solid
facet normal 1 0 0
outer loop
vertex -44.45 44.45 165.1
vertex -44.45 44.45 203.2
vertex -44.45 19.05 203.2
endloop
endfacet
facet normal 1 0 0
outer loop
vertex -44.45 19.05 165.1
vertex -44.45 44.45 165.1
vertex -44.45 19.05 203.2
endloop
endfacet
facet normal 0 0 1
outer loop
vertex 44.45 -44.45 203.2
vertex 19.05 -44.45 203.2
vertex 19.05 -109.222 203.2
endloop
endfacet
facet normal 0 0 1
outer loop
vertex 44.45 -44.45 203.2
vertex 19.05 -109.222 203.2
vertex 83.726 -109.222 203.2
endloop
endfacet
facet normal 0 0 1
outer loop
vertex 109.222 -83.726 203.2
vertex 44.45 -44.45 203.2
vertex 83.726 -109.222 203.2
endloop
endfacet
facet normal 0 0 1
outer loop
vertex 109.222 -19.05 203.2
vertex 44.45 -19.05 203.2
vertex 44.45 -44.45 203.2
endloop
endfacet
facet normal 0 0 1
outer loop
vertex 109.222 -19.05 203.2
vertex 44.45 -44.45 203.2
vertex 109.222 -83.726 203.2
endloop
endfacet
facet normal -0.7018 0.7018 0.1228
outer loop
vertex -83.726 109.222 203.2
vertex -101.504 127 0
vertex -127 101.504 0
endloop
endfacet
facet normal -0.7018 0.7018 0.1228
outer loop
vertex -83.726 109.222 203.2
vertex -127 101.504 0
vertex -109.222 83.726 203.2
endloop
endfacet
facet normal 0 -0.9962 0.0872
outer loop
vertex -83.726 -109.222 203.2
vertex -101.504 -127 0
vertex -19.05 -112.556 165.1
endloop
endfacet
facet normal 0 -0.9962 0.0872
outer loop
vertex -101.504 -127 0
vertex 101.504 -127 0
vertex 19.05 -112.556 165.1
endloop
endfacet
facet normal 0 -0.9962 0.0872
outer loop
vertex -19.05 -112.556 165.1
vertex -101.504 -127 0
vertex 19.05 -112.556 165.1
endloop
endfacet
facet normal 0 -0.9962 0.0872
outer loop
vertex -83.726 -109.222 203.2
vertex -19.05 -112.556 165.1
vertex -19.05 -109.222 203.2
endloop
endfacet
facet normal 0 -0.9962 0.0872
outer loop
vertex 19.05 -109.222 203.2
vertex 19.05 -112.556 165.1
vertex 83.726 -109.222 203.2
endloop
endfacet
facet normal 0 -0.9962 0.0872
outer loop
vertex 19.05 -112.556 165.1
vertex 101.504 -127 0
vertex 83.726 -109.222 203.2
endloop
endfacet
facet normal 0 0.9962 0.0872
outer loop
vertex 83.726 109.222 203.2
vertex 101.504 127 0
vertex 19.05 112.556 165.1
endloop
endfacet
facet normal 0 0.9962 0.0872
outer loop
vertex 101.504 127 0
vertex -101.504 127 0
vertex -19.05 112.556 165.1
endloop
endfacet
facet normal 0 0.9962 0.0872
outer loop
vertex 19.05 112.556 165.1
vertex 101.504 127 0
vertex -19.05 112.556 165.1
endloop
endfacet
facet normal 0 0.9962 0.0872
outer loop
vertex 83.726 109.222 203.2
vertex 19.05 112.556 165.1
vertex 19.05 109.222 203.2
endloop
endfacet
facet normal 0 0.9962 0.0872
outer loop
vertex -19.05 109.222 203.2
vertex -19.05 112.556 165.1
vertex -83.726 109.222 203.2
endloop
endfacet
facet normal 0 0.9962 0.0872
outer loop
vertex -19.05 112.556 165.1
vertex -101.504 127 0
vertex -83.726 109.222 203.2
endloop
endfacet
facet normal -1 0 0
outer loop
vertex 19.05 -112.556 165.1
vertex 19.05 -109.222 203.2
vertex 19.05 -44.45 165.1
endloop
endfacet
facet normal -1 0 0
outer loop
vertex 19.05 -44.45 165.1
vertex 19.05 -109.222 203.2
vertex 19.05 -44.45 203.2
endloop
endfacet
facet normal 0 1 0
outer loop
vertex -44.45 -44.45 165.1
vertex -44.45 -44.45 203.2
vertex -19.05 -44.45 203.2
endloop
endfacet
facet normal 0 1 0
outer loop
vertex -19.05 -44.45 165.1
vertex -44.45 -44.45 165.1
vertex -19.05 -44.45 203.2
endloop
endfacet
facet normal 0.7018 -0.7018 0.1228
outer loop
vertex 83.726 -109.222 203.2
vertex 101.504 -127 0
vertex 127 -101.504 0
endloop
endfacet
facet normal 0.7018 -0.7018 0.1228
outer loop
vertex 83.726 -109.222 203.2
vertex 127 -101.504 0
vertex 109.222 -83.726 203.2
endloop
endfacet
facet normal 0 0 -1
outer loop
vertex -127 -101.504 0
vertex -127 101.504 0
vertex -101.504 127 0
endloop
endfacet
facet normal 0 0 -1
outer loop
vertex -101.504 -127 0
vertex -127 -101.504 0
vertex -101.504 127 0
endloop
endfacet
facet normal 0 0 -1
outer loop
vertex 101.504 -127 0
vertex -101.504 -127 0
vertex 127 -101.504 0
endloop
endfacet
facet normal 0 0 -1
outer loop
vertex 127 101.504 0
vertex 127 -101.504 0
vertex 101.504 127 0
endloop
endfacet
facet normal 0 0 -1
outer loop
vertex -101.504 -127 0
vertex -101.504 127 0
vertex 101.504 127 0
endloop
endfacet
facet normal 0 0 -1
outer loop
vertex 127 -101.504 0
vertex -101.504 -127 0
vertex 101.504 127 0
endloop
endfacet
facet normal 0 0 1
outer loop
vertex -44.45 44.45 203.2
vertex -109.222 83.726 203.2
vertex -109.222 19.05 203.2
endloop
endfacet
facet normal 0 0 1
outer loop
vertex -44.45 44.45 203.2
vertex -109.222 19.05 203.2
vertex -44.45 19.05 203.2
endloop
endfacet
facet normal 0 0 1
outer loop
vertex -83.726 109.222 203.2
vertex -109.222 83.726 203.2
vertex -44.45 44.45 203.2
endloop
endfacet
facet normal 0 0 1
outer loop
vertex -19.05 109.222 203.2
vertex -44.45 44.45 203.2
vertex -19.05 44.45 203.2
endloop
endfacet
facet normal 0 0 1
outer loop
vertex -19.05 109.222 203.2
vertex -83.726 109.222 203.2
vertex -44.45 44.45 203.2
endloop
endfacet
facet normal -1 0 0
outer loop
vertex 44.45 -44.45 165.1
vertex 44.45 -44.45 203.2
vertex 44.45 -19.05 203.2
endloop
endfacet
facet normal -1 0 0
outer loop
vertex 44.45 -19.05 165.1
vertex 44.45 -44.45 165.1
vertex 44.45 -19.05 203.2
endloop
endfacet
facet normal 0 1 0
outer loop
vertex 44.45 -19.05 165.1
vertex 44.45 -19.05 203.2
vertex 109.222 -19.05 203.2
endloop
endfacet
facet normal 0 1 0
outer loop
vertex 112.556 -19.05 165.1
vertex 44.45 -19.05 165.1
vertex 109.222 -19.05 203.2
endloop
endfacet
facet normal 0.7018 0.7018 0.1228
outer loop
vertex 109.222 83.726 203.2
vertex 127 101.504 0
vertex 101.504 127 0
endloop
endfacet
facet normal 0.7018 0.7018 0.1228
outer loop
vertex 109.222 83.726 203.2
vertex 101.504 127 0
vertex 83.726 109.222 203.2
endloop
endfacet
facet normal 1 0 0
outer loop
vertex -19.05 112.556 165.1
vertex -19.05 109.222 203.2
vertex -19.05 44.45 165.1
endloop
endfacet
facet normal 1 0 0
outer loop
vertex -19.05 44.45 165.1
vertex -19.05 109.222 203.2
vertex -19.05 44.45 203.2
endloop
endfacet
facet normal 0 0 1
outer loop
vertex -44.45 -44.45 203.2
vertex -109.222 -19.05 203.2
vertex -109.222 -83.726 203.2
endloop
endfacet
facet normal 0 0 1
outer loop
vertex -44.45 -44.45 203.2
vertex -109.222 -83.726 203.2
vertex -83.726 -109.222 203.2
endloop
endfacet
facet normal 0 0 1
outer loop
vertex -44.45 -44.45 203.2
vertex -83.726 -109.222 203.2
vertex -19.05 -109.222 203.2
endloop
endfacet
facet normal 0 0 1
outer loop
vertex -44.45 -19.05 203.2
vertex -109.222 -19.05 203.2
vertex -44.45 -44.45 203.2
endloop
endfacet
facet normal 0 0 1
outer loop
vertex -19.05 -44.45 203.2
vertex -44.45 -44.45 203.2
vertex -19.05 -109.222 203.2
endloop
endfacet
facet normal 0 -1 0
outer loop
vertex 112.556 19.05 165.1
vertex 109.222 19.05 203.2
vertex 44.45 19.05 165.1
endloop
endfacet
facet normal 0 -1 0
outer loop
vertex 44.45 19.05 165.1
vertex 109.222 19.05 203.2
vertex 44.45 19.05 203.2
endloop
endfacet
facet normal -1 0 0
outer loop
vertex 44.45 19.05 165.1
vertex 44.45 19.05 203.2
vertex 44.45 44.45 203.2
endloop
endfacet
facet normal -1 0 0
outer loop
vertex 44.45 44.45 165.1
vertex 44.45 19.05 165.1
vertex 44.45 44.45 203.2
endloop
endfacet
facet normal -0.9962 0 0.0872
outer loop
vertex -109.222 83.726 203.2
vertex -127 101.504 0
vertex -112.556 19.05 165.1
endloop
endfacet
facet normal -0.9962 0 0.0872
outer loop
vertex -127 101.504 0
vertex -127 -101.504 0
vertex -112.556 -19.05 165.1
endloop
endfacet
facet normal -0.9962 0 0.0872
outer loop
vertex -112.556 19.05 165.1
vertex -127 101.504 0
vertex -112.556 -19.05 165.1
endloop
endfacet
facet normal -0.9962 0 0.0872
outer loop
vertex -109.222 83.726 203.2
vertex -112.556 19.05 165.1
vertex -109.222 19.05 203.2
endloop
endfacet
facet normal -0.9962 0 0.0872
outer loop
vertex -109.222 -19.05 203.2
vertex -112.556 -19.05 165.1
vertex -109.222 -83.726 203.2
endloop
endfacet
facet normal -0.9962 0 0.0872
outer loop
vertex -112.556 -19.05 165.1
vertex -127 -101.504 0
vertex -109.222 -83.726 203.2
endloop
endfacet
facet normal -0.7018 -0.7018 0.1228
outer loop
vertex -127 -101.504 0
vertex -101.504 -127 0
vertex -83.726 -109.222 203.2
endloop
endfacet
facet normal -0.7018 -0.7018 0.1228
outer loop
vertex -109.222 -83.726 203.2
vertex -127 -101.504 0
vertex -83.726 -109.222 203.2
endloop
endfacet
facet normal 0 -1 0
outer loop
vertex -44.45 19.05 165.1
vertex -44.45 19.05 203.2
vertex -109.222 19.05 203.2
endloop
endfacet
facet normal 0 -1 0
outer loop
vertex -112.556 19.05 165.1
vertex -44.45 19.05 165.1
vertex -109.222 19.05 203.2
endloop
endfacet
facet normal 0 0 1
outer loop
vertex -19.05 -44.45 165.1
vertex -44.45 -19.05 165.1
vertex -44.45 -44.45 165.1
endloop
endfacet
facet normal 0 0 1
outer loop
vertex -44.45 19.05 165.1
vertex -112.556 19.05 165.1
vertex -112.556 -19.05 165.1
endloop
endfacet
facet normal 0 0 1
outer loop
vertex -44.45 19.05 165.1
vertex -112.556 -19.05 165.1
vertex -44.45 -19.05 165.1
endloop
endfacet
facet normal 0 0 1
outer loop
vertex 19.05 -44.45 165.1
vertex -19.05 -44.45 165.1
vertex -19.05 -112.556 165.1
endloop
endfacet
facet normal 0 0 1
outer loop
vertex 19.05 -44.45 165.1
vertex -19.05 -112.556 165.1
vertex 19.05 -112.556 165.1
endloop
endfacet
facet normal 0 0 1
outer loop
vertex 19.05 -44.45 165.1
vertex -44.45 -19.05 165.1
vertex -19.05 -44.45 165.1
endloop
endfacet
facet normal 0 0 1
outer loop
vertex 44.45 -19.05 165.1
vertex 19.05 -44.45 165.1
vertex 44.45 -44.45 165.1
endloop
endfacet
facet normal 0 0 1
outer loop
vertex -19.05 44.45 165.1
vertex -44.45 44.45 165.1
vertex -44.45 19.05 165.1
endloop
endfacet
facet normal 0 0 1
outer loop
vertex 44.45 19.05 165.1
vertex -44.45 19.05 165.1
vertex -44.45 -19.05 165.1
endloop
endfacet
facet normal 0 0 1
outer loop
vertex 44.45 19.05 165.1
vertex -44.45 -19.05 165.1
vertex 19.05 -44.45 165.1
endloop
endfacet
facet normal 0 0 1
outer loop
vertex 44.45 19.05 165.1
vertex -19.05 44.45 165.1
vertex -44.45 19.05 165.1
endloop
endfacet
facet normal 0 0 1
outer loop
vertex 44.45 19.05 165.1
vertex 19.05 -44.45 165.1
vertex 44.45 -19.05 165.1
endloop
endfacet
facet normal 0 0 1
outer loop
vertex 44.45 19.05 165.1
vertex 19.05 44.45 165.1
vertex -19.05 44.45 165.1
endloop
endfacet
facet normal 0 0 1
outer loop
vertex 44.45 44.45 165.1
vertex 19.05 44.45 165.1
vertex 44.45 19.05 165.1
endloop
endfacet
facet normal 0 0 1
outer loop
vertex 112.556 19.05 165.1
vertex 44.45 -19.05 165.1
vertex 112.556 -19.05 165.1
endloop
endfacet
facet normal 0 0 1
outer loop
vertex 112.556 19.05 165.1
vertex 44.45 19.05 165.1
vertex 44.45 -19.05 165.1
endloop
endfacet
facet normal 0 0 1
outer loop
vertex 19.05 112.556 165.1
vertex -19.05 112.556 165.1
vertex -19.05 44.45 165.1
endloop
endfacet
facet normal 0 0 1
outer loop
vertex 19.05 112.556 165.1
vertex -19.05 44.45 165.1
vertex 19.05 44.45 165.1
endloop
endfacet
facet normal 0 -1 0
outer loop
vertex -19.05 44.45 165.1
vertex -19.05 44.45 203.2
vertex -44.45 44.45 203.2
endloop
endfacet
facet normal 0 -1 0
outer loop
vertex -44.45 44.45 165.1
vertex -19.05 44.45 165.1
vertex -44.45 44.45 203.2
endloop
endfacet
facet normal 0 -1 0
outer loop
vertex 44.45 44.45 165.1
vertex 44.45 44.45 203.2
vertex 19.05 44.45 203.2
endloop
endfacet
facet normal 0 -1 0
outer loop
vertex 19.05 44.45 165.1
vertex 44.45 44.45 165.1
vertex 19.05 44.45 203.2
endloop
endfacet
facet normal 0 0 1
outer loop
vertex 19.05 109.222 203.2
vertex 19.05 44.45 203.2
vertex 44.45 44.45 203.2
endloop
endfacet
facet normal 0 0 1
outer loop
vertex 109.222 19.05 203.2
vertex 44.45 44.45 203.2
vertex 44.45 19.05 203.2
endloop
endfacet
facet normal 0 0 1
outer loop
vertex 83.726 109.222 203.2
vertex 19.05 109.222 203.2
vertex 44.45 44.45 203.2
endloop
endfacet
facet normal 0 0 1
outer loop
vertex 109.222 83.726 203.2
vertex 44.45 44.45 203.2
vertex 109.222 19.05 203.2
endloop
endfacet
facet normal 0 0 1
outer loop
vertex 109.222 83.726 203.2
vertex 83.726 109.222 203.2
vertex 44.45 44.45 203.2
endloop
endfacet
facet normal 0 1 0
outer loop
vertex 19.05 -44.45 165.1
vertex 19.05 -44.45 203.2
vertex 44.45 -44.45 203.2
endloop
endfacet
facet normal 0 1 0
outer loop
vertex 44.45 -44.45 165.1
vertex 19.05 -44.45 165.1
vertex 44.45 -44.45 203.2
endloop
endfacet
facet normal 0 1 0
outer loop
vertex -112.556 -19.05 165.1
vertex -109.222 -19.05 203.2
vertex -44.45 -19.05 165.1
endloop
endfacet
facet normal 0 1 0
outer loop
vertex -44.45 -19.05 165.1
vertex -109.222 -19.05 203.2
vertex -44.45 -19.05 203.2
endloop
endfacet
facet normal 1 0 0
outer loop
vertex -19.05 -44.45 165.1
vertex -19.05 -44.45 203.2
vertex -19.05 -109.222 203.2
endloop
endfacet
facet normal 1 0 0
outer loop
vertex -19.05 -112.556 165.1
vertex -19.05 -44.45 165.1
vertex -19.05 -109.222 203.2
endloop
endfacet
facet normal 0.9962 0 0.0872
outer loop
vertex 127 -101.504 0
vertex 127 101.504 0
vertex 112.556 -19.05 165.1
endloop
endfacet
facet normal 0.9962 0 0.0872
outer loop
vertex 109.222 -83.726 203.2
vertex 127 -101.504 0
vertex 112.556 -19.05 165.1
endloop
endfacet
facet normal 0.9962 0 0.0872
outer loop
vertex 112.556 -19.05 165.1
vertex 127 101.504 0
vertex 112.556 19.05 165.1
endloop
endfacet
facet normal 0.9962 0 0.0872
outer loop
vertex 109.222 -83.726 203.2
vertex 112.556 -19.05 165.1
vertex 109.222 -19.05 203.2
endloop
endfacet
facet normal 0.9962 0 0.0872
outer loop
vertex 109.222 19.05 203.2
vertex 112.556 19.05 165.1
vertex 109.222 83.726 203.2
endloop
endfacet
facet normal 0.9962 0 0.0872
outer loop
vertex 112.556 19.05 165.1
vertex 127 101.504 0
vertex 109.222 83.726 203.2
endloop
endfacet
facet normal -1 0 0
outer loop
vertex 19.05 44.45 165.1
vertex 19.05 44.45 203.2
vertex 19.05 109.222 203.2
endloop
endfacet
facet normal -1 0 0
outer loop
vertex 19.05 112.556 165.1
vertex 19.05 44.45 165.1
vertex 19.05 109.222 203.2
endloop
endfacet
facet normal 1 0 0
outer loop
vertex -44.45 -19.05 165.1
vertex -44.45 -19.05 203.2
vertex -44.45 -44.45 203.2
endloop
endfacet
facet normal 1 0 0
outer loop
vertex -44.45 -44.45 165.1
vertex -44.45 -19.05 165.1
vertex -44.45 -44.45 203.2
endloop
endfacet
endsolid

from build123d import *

# Parameters (mm, degrees)
F0_W     = 254
F0_H     = 254
F1_DEPTH = 203.2
F1_TAPER = 5
F2_SIZE  = 25.4
F4_DEPTH = 38.1


with BuildPart() as f1:
    # F0 (on Top) → F1 (new body)
    with BuildSketch(Plane.XY):
        Rectangle(F0_W, F0_H)
    extrude(amount=F1_DEPTH, taper=F1_TAPER)

    # F2
    f2_edges = [f1.edges().sort_by_distance(p)[0] for p in [
        (-118.111152, -118.111152, 101.6),
        (118.111152, -118.111152, 101.6),
        (118.111152, 118.111152, 101.6),
        (-118.111152, 118.111152, 101.6),
    ]]
    chamfer(f2_edges, length=F2_SIZE)

    # F3 (on face) → F4 (cut)
    with BuildSketch(Plane.XY.offset(203.2)):
        Polygon((19.05, 44.45), (19.05, 132.0214867592), (-19.05, 132.0214867592), (-19.05, 44.45), (-44.45, 44.45), (-44.45, 19.05), (-137.8337591887, 19.05), (-137.8337591887, -19.05), (-44.45, -19.05), (-44.45, -44.45), (-19.05, -44.45), (-19.05, -130.3608417511), (19.05, -130.3608417511), (19.05, -44.45), (44.45, -44.45), (44.45, -19.05), (136.5052312613, -19.05), (136.5052312613, 19.05), (44.45, 19.05), (44.45, 44.45), align=None)
    extrude(amount=-F4_DEPTH, mode=Mode.SUBTRACT)


solid = f1.part
